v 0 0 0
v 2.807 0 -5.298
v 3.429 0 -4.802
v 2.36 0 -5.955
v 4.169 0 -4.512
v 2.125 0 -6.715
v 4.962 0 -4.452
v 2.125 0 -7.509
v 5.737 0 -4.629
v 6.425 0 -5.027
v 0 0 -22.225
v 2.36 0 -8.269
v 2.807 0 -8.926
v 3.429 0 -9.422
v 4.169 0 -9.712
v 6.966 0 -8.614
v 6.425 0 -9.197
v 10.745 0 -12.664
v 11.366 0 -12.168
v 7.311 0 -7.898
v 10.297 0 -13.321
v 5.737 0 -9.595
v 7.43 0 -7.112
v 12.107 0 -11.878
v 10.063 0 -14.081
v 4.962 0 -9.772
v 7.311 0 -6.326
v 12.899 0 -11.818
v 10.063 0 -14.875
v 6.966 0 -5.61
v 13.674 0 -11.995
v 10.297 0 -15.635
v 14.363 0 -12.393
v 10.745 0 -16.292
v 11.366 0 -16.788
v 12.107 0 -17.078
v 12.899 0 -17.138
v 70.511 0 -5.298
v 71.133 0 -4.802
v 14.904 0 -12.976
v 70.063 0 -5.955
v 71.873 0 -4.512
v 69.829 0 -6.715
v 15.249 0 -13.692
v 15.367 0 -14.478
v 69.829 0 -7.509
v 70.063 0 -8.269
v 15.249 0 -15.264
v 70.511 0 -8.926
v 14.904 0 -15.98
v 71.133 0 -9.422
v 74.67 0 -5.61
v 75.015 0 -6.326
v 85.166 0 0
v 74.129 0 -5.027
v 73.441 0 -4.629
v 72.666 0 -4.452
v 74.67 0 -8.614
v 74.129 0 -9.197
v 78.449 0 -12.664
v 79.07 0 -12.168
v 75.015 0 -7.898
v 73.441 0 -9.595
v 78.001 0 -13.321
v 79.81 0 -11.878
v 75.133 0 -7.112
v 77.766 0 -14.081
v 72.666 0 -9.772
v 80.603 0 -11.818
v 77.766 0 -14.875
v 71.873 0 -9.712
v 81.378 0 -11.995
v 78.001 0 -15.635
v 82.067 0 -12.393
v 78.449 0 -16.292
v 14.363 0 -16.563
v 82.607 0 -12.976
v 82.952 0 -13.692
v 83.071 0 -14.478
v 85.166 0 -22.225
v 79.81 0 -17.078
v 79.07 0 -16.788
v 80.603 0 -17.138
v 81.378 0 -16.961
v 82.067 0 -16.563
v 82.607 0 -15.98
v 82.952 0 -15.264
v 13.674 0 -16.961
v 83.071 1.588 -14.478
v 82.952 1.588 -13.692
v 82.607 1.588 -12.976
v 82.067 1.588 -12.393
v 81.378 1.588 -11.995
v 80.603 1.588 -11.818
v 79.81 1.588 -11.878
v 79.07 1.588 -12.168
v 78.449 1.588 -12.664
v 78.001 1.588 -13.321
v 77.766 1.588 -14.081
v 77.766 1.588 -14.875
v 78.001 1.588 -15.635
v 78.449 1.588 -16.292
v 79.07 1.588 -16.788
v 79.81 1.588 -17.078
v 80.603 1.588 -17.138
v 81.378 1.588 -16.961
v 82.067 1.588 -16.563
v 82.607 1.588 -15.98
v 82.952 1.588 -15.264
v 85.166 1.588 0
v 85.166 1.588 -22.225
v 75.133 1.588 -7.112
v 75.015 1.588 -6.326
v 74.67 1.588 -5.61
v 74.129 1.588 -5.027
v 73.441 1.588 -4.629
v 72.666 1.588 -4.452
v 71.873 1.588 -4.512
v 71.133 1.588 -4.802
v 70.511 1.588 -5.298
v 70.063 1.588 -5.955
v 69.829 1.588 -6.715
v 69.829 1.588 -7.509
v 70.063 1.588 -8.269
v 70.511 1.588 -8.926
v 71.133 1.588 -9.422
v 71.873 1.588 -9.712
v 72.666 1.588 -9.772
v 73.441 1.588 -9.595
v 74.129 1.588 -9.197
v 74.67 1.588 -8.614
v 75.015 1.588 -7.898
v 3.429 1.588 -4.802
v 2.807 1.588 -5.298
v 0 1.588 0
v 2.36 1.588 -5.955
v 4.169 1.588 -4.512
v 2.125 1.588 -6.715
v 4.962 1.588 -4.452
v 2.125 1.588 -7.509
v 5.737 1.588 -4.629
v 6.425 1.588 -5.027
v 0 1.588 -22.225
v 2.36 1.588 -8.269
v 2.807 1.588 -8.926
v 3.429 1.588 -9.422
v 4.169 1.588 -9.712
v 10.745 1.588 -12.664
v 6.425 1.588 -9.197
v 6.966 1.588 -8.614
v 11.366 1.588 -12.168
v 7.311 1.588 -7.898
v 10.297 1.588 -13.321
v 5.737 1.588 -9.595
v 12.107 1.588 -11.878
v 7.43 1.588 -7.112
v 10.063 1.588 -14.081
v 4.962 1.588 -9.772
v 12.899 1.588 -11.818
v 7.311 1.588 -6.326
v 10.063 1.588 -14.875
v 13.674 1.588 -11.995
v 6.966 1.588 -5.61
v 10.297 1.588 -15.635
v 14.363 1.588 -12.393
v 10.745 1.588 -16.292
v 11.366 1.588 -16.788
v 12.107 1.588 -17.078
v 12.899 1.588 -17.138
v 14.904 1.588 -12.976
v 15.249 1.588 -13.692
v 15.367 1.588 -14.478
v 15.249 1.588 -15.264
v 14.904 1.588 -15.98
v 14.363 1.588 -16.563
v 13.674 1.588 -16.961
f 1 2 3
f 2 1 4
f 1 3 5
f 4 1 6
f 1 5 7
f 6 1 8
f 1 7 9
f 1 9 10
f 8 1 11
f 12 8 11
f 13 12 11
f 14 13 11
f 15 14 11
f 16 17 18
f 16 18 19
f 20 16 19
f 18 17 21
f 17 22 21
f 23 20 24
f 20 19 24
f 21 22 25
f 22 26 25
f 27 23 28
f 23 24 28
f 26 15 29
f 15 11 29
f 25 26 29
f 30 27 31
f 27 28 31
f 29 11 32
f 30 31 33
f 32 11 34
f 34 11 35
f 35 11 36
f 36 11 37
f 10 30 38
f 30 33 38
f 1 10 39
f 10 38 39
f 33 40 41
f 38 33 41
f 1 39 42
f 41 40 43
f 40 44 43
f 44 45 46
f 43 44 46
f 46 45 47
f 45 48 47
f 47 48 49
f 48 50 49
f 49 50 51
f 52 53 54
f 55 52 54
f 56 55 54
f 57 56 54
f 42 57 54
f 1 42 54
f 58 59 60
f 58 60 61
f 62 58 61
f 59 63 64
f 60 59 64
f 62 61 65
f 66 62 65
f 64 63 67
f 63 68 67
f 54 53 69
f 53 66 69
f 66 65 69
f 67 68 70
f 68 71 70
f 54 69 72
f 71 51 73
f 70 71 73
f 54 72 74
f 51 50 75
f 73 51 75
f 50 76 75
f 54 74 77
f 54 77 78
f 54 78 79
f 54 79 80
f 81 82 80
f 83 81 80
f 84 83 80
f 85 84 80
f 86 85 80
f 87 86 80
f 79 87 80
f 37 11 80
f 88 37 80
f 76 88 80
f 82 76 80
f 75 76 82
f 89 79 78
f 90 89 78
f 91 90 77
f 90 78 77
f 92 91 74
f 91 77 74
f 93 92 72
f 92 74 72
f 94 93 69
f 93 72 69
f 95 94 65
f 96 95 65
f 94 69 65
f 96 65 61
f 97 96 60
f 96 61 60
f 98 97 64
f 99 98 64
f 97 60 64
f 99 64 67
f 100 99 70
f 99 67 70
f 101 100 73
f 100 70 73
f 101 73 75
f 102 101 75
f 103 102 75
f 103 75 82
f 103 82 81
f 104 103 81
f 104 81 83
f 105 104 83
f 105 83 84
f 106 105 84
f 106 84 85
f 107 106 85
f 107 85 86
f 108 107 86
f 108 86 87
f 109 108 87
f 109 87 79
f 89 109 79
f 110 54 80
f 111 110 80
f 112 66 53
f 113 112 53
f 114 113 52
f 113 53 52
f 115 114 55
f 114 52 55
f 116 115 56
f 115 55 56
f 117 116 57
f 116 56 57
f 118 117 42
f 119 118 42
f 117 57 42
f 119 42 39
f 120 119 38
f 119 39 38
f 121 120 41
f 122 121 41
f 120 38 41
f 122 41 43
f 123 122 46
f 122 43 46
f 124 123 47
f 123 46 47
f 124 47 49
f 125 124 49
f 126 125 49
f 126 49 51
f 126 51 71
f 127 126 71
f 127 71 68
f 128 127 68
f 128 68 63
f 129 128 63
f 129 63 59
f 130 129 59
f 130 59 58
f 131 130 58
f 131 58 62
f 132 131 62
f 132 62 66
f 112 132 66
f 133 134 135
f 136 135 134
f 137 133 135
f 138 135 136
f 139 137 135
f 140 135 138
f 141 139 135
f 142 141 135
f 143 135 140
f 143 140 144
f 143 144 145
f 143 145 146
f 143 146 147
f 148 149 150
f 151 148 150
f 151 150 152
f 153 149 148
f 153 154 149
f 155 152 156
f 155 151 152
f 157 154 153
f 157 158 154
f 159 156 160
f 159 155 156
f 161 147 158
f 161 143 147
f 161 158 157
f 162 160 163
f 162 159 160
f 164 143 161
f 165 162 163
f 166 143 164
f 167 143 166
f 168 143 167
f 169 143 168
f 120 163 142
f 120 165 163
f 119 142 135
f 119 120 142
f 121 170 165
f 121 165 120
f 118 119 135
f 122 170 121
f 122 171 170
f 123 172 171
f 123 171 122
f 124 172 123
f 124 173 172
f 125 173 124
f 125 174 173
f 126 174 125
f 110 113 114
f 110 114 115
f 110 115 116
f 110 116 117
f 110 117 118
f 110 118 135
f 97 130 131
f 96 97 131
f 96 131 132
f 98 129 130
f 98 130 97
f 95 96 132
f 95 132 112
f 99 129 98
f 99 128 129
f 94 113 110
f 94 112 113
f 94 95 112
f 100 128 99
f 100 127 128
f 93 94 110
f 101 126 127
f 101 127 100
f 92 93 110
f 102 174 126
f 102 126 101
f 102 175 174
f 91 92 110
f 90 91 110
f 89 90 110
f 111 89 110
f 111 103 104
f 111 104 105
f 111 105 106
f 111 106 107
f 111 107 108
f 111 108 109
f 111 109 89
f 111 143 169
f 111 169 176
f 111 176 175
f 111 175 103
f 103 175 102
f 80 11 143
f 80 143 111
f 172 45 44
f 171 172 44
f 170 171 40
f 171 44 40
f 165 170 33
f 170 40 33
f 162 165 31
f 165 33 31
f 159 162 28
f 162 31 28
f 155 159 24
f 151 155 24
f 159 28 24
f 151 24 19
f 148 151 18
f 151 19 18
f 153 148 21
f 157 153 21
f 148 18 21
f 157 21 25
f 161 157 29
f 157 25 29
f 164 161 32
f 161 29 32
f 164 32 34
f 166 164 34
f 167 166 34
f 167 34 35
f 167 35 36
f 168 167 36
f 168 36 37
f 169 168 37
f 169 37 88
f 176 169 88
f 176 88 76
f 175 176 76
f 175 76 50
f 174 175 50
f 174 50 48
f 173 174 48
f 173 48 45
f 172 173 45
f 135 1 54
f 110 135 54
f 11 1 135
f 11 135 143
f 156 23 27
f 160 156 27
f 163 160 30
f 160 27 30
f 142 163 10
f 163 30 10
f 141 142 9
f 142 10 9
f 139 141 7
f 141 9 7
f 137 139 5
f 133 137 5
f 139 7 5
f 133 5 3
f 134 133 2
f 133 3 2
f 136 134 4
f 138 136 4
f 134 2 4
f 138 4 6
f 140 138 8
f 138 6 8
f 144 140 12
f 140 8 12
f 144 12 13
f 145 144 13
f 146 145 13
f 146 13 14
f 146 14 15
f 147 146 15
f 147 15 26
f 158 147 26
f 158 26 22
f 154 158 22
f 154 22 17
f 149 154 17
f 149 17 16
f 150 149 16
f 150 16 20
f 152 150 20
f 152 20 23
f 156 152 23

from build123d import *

# Parameters (mm, degrees)
SKETCH1_W           = 85.1662
SKETCH1_H           = 22.225
BOSS_EXTRUDE1_DEPTH = 1.5875
CUT_EXTRUDE1_REACH  = 3.587
SKETCH2_R           = 2.667


with BuildPart() as part:
    # Sketch1 → Boss-Extrude1 (new body)
    with BuildSketch(Plane(origin=(0, 0, 0), x_dir=(1, 0, 0), z_dir=(0, 1, 0))):
        with Locations((42.5831, 11.1125)):
            Rectangle(SKETCH1_W, SKETCH1_H)
    extrude(amount=BOSS_EXTRUDE1_DEPTH)

    # Sketch2 → Cut-Extrude1 (cut, up to next)
    with BuildSketch(Plane.XZ, mode=Mode.PRIVATE) as cut_extrude1_sk1:
        with Locations((4.7625, -7.112)):
            Circle(SKETCH2_R)
    cut_extrude1_tool1 = extrude(cut_extrude1_sk1.sketch, amount=-CUT_EXTRUDE1_REACH, mode=Mode.PRIVATE) & part.part
    add(cut_extrude1_tool1.solids().sort_by_distance((4.7625, 0, -7.112))[0], mode=Mode.SUBTRACT)
    # Sketch2 → Cut-Extrude1 (cut, up to next)
    with BuildSketch(Plane.XZ, mode=Mode.PRIVATE) as cut_extrude1_sk2:
        with Locations((12.7, -14.478)):
            Circle(SKETCH2_R)
    cut_extrude1_tool2 = extrude(cut_extrude1_sk2.sketch, amount=-CUT_EXTRUDE1_REACH, mode=Mode.PRIVATE) & part.part
    add(cut_extrude1_tool2.solids().sort_by_distance((12.7, 0, -14.478))[0], mode=Mode.SUBTRACT)
    # Sketch2 → Cut-Extrude1 (cut, up to next)
    with BuildSketch(Plane.XZ, mode=Mode.PRIVATE) as cut_extrude1_sk3:
        with Locations((72.4662, -7.112)):
            Circle(SKETCH2_R)
    cut_extrude1_tool3 = extrude(cut_extrude1_sk3.sketch, amount=-CUT_EXTRUDE1_REACH, mode=Mode.PRIVATE) & part.part
    add(cut_extrude1_tool3.solids().sort_by_distance((72.4662, 0, -7.112))[0], mode=Mode.SUBTRACT)
    # Sketch2 → Cut-Extrude1 (cut, up to next)
    with BuildSketch(Plane.XZ, mode=Mode.PRIVATE) as cut_extrude1_sk4:
        with Locations((80.4037, -14.478)):
            Circle(SKETCH2_R)
    cut_extrude1_tool4 = extrude(cut_extrude1_sk4.sketch, amount=-CUT_EXTRUDE1_REACH, mode=Mode.PRIVATE) & part.part
    add(cut_extrude1_tool4.solids().sort_by_distance((80.4037, 0, -14.478))[0], mode=Mode.SUBTRACT)


solid = part.part
